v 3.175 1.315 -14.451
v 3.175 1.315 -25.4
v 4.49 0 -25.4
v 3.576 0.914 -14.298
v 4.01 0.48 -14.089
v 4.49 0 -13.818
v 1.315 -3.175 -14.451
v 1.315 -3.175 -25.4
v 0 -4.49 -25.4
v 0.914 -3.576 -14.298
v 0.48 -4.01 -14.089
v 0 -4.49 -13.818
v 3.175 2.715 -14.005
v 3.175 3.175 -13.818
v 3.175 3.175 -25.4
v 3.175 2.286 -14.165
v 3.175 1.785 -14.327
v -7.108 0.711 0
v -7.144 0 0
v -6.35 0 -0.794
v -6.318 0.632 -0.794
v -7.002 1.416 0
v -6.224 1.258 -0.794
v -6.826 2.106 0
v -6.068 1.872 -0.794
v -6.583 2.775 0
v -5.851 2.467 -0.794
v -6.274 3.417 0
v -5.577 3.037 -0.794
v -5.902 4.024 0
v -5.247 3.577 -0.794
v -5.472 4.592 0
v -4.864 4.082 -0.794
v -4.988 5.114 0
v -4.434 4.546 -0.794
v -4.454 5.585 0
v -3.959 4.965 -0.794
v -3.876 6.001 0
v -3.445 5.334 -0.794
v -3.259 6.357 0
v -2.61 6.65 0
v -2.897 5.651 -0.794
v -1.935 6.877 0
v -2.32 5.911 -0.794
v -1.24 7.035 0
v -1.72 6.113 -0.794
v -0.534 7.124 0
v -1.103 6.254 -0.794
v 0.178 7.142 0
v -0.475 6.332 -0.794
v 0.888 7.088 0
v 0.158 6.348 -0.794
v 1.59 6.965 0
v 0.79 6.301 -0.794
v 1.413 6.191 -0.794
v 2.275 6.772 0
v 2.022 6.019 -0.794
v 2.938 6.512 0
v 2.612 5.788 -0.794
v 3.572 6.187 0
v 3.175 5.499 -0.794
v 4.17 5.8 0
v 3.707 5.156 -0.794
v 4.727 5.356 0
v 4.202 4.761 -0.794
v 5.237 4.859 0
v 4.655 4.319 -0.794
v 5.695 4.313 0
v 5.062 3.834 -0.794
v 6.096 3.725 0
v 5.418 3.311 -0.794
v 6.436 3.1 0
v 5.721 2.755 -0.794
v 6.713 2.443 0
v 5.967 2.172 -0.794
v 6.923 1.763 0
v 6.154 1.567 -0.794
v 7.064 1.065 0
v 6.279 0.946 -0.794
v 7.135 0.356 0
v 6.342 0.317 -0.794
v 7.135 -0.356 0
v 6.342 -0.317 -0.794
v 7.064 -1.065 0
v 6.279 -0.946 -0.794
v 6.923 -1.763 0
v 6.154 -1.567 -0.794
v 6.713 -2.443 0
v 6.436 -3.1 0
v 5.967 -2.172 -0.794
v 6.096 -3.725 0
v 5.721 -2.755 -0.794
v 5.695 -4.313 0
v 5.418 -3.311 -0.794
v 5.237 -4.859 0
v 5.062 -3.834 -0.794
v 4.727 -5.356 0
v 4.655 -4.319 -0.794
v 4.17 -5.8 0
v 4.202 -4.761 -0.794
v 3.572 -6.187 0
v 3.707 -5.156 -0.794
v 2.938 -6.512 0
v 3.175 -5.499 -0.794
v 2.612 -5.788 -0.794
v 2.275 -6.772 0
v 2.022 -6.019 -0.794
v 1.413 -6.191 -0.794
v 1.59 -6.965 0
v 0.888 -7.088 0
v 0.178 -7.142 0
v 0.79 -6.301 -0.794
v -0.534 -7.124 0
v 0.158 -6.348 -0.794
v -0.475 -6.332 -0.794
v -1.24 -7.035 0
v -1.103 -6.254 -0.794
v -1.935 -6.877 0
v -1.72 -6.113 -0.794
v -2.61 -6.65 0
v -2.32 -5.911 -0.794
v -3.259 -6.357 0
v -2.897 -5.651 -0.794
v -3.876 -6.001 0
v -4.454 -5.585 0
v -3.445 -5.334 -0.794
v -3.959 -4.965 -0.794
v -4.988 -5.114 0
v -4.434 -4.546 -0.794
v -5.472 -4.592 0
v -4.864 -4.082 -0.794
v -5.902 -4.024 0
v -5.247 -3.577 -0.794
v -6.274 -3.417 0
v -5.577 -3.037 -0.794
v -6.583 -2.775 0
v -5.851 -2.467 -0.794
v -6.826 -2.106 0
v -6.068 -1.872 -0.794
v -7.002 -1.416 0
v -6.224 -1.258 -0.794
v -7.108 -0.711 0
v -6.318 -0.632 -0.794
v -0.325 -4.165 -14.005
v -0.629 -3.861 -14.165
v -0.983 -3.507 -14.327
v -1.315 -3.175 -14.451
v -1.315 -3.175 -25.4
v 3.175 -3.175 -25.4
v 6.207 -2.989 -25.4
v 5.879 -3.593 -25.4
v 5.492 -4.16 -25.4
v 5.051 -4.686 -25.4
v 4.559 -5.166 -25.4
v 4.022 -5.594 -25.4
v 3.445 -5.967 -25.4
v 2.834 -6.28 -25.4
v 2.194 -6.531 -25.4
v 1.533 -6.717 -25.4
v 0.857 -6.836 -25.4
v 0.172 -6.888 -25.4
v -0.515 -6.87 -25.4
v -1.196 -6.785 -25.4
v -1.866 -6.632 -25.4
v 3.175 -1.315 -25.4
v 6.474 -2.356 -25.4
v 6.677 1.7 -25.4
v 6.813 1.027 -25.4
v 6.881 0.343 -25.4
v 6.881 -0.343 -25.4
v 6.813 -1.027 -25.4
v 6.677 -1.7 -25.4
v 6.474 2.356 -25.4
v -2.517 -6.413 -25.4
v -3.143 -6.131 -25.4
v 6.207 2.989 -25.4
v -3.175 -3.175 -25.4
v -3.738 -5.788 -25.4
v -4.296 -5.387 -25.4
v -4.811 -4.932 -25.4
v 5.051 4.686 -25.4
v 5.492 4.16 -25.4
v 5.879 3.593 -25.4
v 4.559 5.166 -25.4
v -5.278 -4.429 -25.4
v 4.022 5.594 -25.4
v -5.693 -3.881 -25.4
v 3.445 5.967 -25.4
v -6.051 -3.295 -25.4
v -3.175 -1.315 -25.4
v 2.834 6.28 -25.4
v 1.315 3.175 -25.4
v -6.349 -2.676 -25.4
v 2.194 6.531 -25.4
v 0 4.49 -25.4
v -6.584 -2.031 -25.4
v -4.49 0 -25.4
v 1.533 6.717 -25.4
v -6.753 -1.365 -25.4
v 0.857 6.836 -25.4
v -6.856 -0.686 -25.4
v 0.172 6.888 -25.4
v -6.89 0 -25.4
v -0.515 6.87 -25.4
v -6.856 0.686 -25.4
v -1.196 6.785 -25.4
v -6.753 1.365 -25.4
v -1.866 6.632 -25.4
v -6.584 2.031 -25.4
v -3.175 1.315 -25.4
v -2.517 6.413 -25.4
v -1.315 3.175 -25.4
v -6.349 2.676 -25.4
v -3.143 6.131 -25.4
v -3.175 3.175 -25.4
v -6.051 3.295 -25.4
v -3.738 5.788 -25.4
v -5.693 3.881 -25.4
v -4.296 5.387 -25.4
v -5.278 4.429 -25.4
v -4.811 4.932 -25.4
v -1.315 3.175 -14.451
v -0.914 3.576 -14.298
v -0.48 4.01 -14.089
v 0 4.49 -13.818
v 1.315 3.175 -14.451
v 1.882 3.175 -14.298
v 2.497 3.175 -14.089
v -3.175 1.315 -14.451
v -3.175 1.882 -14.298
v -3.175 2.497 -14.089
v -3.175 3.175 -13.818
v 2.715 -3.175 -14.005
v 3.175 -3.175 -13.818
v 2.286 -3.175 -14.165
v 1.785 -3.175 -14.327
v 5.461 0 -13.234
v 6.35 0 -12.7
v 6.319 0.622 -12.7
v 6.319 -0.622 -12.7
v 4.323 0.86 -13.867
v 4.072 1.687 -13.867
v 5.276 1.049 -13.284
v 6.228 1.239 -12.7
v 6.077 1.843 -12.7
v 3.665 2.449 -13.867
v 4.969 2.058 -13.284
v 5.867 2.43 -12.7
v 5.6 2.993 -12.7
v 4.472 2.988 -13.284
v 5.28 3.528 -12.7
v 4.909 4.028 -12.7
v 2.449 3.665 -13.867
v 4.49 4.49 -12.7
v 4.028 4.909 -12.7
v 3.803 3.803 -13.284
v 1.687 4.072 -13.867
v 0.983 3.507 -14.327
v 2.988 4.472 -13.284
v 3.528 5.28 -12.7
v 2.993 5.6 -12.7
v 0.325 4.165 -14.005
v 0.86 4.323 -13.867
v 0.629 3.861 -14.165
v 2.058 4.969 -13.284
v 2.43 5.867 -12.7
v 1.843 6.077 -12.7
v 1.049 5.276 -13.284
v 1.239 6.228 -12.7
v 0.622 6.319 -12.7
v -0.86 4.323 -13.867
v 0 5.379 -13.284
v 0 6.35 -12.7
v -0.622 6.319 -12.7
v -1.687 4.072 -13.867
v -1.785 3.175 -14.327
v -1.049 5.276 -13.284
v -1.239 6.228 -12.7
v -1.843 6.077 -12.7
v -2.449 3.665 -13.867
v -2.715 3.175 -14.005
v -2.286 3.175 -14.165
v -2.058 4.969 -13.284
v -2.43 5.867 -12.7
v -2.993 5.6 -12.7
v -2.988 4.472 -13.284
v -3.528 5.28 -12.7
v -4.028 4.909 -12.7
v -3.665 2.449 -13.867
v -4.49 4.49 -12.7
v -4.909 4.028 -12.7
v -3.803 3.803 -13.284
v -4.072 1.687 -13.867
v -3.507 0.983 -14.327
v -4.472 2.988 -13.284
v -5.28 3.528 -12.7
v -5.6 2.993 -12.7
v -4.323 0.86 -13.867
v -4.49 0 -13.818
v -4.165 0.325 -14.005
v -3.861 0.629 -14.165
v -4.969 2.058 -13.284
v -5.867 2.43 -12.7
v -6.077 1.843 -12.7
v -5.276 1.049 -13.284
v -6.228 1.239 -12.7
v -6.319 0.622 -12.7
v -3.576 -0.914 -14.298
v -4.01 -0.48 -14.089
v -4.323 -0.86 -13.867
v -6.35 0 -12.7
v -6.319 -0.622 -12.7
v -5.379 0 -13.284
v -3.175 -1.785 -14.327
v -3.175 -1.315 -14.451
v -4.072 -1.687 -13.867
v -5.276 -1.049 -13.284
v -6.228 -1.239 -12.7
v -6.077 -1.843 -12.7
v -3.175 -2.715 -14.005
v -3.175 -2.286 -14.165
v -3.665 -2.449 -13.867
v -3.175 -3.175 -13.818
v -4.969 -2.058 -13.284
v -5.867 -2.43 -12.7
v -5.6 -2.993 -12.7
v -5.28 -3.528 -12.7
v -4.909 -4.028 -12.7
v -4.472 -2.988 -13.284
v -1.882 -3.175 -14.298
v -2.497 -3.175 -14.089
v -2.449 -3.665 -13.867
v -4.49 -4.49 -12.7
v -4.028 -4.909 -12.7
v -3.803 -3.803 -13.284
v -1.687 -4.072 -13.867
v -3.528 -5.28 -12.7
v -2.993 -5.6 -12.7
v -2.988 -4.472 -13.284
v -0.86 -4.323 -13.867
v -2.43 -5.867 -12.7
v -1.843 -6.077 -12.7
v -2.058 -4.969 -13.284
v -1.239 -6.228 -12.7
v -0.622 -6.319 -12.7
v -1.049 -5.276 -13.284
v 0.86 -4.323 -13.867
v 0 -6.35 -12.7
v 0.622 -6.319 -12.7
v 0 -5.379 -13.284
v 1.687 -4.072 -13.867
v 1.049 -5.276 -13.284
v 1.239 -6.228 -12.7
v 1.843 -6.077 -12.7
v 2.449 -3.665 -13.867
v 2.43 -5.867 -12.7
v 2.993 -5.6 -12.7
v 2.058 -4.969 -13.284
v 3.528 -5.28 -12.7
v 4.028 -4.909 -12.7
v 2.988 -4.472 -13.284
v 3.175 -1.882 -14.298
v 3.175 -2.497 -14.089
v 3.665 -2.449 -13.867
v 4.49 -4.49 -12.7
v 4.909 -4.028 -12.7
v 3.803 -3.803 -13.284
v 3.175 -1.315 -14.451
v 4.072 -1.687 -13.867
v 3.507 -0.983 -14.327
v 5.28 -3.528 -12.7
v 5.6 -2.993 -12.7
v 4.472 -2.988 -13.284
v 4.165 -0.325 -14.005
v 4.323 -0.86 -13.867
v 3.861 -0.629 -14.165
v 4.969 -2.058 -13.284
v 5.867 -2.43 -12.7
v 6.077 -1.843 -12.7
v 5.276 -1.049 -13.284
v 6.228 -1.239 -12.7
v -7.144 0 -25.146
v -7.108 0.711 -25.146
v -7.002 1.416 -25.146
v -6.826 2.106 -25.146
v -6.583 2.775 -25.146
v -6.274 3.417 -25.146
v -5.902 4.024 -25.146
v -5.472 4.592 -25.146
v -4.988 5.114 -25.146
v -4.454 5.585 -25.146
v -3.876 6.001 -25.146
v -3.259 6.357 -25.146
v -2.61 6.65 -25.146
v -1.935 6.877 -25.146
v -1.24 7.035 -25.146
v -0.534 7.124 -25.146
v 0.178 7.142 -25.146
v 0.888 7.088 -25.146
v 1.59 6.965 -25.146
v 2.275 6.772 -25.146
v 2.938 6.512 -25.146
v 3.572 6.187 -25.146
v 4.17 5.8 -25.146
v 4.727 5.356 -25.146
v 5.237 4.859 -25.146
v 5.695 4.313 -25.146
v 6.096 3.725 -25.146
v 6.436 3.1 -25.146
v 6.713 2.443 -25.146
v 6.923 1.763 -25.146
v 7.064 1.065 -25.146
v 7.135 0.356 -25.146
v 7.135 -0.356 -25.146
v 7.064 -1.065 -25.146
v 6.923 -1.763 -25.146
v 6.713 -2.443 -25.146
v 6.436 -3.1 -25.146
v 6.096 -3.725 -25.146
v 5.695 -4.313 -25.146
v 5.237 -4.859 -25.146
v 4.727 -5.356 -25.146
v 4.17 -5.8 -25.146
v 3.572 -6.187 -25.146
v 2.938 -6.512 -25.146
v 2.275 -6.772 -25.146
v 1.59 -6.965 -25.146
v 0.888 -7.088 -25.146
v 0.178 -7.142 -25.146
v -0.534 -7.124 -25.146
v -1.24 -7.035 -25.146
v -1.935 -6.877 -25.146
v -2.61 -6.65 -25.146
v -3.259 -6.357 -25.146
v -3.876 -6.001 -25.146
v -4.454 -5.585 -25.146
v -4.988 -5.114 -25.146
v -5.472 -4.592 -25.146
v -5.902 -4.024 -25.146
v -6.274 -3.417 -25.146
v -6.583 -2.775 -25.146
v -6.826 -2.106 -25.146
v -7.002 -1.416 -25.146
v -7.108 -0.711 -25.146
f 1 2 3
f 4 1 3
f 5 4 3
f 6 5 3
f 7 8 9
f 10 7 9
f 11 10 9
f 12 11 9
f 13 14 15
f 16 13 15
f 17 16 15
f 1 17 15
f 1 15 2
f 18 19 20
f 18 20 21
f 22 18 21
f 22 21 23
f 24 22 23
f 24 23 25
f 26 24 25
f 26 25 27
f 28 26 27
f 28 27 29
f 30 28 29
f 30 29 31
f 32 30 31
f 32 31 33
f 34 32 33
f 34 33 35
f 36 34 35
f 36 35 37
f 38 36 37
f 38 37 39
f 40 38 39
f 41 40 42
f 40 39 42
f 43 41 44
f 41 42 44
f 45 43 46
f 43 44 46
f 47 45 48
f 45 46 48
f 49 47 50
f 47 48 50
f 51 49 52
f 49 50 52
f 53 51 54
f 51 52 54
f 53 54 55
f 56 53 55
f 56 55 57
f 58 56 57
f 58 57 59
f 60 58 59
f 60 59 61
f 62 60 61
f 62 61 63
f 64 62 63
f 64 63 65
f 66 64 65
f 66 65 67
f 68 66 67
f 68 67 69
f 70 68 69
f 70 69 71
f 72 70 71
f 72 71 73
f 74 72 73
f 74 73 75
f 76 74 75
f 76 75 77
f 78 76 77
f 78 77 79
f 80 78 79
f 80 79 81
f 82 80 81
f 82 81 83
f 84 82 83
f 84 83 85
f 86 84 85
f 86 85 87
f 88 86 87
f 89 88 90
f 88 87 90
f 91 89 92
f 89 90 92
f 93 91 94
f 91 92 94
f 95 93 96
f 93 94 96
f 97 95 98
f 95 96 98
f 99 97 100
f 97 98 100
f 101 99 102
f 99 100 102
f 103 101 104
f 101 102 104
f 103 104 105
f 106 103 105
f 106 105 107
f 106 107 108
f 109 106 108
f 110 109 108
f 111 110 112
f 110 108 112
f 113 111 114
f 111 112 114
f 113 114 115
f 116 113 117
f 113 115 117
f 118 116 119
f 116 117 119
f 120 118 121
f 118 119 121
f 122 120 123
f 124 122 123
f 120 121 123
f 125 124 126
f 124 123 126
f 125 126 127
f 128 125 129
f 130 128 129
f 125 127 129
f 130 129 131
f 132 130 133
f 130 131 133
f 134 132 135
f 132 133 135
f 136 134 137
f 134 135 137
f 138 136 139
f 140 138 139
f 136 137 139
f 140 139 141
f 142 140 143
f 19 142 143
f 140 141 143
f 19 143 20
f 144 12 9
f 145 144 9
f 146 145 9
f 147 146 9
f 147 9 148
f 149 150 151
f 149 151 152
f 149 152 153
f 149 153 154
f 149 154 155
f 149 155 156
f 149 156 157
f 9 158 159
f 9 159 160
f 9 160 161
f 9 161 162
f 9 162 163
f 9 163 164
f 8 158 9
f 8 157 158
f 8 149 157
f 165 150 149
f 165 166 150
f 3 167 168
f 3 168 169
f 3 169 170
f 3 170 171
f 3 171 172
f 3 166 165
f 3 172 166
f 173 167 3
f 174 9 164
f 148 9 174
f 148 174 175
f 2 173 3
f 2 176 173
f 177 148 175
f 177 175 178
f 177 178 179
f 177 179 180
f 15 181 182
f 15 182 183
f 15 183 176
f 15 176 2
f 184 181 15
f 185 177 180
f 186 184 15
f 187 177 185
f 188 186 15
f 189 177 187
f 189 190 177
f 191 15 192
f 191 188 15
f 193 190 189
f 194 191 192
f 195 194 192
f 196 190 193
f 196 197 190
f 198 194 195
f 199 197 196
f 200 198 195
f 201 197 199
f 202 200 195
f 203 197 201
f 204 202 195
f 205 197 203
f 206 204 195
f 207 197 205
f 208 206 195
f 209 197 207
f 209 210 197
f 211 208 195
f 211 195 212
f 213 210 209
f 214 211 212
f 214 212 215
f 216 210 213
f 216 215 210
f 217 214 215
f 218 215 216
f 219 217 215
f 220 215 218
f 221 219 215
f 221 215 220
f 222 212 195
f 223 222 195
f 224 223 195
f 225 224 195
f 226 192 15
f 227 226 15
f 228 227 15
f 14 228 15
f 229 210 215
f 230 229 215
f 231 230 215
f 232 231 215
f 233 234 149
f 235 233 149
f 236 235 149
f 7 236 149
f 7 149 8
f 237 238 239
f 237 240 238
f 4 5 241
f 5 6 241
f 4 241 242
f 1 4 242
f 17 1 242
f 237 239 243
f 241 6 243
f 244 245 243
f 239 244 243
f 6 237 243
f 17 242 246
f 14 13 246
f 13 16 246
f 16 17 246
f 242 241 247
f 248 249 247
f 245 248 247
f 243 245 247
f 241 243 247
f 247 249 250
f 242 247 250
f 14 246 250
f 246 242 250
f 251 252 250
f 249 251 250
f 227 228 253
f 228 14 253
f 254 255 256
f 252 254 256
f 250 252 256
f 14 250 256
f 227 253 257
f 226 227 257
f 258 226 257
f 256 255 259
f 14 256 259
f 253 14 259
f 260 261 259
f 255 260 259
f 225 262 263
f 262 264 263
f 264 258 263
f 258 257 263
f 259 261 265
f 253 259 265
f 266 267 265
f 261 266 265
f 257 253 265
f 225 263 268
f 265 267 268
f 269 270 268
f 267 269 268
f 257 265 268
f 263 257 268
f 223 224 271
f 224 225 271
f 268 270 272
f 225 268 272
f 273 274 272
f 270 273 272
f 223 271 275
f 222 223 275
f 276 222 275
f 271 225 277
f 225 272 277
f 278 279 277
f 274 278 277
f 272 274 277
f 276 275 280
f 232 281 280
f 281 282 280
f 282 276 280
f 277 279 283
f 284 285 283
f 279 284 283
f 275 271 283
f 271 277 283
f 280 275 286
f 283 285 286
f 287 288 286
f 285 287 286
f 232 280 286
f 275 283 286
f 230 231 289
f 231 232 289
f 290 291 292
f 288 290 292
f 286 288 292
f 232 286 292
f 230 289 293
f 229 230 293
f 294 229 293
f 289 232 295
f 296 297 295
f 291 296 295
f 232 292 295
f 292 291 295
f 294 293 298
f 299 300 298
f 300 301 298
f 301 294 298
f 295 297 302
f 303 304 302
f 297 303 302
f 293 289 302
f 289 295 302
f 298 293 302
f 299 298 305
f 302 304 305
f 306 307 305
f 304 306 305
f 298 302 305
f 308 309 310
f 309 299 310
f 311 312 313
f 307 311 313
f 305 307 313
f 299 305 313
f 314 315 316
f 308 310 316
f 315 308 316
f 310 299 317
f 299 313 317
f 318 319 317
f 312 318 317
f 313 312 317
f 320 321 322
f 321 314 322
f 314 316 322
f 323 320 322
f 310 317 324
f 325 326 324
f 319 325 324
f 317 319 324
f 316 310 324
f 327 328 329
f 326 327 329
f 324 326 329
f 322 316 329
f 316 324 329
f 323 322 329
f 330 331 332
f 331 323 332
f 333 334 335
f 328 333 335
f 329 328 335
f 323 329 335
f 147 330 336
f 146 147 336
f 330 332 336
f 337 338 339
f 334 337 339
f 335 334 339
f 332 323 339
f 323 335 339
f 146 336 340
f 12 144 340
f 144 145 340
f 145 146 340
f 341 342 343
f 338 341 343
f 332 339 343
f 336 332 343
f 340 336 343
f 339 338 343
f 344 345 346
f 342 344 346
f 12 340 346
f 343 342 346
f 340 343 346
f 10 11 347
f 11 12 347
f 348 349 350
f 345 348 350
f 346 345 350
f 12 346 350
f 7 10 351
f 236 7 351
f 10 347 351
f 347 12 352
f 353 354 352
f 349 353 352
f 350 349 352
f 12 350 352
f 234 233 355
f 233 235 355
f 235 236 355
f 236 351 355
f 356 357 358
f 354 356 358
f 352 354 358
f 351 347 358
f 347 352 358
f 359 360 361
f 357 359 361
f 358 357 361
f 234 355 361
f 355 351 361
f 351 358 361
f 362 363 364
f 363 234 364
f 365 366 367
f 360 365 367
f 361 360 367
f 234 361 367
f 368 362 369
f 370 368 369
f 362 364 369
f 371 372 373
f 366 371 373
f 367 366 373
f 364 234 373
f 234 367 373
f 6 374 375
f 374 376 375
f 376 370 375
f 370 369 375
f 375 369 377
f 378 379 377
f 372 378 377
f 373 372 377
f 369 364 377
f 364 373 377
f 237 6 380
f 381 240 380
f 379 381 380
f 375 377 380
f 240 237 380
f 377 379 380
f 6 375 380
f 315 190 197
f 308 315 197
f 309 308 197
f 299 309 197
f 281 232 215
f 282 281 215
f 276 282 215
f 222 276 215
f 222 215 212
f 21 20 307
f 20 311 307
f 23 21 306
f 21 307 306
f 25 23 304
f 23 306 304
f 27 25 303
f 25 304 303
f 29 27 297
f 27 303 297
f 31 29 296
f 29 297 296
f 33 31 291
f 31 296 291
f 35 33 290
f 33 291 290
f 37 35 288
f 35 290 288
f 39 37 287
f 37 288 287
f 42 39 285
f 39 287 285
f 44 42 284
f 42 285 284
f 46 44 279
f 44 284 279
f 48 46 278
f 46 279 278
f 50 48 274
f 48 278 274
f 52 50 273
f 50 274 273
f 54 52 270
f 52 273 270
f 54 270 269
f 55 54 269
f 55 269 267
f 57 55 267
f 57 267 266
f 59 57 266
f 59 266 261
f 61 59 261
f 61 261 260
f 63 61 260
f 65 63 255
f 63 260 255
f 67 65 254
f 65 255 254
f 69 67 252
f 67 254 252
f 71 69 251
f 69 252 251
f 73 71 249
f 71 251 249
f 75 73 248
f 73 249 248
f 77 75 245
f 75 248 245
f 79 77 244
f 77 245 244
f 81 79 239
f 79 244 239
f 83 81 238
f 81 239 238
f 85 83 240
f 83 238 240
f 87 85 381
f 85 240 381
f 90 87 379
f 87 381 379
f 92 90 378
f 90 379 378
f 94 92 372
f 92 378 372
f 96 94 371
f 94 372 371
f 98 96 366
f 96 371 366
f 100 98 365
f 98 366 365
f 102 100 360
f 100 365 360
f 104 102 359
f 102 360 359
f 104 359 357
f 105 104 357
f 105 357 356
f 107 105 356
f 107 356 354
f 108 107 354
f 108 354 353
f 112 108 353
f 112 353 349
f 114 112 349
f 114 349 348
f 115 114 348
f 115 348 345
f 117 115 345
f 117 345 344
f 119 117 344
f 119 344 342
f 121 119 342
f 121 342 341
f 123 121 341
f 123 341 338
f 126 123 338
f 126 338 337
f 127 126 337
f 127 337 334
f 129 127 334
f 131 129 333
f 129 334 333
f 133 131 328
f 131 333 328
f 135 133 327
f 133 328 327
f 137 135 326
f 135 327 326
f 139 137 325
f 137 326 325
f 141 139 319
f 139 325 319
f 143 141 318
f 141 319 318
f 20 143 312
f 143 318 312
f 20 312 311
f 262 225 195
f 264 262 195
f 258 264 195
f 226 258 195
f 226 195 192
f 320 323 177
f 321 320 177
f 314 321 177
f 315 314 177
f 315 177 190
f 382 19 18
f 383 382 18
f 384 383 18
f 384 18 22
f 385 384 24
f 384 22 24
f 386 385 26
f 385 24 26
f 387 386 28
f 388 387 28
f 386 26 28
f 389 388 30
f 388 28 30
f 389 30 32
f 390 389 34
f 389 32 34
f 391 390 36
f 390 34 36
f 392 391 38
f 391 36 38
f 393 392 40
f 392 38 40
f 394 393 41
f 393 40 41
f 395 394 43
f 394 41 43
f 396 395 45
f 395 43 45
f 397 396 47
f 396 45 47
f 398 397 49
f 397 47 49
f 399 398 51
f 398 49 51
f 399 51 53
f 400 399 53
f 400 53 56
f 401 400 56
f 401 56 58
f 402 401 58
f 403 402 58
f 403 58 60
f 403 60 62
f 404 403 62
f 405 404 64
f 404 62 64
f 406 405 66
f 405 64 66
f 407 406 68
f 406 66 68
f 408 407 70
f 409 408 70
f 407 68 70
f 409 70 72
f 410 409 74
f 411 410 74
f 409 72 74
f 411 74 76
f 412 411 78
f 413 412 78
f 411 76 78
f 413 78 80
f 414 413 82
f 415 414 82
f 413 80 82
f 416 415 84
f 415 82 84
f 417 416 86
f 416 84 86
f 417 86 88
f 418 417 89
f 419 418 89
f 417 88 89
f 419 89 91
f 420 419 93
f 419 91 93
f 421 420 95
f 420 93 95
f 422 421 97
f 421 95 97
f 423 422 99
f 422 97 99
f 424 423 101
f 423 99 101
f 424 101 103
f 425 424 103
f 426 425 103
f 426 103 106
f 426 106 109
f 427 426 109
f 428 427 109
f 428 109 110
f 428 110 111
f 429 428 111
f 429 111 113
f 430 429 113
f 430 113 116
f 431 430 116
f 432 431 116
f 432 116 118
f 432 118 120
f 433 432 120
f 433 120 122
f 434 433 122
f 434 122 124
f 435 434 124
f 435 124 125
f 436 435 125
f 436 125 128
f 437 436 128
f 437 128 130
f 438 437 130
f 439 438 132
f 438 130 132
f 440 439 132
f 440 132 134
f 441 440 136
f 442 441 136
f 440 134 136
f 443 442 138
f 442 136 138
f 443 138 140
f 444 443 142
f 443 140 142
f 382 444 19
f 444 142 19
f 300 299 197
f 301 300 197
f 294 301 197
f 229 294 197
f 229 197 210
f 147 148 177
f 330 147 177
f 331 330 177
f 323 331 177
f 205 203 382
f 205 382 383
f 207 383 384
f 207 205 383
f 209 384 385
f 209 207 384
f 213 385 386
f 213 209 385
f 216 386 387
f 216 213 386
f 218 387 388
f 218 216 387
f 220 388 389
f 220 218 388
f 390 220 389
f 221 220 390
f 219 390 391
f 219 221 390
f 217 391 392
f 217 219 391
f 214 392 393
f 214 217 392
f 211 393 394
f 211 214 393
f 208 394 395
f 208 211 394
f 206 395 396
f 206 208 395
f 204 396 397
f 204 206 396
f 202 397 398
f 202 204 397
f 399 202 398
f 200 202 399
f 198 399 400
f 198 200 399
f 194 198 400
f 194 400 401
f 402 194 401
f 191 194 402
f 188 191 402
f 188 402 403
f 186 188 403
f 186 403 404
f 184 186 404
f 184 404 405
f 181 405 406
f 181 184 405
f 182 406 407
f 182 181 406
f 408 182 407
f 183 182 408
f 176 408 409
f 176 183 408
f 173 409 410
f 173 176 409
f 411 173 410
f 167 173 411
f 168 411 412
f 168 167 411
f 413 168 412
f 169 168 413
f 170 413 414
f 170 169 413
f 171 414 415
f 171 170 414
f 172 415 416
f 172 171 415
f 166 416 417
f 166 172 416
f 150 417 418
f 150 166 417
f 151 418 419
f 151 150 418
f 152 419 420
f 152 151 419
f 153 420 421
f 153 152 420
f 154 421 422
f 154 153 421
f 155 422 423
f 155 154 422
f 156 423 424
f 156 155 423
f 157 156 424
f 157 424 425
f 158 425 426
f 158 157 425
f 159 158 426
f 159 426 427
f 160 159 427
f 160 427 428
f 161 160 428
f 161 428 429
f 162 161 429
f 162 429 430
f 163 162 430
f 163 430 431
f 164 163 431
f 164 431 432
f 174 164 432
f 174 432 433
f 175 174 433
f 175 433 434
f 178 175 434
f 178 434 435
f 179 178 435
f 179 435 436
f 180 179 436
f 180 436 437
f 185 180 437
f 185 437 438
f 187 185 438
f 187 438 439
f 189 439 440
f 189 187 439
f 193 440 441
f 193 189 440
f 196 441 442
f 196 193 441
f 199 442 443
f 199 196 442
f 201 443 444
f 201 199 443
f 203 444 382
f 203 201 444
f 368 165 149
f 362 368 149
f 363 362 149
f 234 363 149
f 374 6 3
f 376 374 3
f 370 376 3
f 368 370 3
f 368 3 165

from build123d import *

# Parameters (mm, degrees)
F0_W           = 7.14375
F0_H           = 25.4
F3_D           = 12.7
F3_DEPTH       = 12.7
F3_CSINK_D     = 14.2875
F3_CSINK_ANGLE = 90
F3_TIP         = 3.8154649308
F5_DEPTH       = 12.7
F6_SIZE        = 0.254


with BuildPart() as f1:
    # F0 (on Front) → F1 (revolve)
    with BuildSketch(Plane.XZ):
        with Locations((-3.571875, -12.7)):
            Rectangle(F0_W, F0_H)
    revolve(axis=Axis((0, 0, -12.7), (0, 0, -1)))

    # F3
    with Locations(Plane.XY):
        with Locations((0, 0)):
            CounterSinkHole(F3_D / 2, F3_CSINK_D / 2, depth=F3_DEPTH, counter_sink_angle=F3_CSINK_ANGLE)
            with Locations((0, 0, -(F3_DEPTH + F3_TIP / 2))):  # 118° drill point
                Cone(0, F3_D / 2, F3_TIP, mode=Mode.SUBTRACT)

    # F4 (on face) → F5 (cut)
    with BuildSketch(Plane(origin=(0, 0, -25.4), x_dir=(1, 0, 0), z_dir=(0, 0, -1))):
        Polygon((-3.175, -1.3151280605), (-3.175, -3.175), (-1.3151280605, -3.175), align=None)
        Polygon((1.3151280605, -3.175), (-1.3151280605, -3.175), (0, -4.4901280605), align=None)
        Polygon((3.175, -1.3151280605), (1.3151280605, -3.175), (3.175, -3.175), align=None)
        Polygon((-3.175, 3.175), (-3.175, 1.3151280605), (-1.3151280605, 3.175), align=None)
        Polygon((0, 4.4901280605), (-1.3151280605, 3.175), (1.3151280605, 3.175), align=None)
        Polygon((1.3151280605, 3.175), (3.175, 1.3151280605), (3.175, 3.175), align=None)
        Polygon((-4.4901280605, 0), (-3.175, -1.3151280605), (-3.175, 1.3151280605), align=None)
        Polygon((-3.175, -1.3151280605), (-1.3151280605, -3.175), (1.3151280605, -3.175), (3.175, -1.3151280605), (3.175, 1.3151280605), (1.3151280605, 3.175), (-1.3151280605, 3.175), (-3.175, 1.3151280605), align=None)
        Polygon((3.175, 1.3151280605), (3.175, -1.3151280605), (4.4901280605, 0), align=None)
    extrude(amount=-F5_DEPTH, mode=Mode.SUBTRACT)

    # F6
    f6_edges = [f1.edges().sort_by_distance(p)[0] for p in [
        (7.14375, 0, -25.4),
    ]]
    chamfer(f6_edges, length=F6_SIZE)


solid = f1.part
